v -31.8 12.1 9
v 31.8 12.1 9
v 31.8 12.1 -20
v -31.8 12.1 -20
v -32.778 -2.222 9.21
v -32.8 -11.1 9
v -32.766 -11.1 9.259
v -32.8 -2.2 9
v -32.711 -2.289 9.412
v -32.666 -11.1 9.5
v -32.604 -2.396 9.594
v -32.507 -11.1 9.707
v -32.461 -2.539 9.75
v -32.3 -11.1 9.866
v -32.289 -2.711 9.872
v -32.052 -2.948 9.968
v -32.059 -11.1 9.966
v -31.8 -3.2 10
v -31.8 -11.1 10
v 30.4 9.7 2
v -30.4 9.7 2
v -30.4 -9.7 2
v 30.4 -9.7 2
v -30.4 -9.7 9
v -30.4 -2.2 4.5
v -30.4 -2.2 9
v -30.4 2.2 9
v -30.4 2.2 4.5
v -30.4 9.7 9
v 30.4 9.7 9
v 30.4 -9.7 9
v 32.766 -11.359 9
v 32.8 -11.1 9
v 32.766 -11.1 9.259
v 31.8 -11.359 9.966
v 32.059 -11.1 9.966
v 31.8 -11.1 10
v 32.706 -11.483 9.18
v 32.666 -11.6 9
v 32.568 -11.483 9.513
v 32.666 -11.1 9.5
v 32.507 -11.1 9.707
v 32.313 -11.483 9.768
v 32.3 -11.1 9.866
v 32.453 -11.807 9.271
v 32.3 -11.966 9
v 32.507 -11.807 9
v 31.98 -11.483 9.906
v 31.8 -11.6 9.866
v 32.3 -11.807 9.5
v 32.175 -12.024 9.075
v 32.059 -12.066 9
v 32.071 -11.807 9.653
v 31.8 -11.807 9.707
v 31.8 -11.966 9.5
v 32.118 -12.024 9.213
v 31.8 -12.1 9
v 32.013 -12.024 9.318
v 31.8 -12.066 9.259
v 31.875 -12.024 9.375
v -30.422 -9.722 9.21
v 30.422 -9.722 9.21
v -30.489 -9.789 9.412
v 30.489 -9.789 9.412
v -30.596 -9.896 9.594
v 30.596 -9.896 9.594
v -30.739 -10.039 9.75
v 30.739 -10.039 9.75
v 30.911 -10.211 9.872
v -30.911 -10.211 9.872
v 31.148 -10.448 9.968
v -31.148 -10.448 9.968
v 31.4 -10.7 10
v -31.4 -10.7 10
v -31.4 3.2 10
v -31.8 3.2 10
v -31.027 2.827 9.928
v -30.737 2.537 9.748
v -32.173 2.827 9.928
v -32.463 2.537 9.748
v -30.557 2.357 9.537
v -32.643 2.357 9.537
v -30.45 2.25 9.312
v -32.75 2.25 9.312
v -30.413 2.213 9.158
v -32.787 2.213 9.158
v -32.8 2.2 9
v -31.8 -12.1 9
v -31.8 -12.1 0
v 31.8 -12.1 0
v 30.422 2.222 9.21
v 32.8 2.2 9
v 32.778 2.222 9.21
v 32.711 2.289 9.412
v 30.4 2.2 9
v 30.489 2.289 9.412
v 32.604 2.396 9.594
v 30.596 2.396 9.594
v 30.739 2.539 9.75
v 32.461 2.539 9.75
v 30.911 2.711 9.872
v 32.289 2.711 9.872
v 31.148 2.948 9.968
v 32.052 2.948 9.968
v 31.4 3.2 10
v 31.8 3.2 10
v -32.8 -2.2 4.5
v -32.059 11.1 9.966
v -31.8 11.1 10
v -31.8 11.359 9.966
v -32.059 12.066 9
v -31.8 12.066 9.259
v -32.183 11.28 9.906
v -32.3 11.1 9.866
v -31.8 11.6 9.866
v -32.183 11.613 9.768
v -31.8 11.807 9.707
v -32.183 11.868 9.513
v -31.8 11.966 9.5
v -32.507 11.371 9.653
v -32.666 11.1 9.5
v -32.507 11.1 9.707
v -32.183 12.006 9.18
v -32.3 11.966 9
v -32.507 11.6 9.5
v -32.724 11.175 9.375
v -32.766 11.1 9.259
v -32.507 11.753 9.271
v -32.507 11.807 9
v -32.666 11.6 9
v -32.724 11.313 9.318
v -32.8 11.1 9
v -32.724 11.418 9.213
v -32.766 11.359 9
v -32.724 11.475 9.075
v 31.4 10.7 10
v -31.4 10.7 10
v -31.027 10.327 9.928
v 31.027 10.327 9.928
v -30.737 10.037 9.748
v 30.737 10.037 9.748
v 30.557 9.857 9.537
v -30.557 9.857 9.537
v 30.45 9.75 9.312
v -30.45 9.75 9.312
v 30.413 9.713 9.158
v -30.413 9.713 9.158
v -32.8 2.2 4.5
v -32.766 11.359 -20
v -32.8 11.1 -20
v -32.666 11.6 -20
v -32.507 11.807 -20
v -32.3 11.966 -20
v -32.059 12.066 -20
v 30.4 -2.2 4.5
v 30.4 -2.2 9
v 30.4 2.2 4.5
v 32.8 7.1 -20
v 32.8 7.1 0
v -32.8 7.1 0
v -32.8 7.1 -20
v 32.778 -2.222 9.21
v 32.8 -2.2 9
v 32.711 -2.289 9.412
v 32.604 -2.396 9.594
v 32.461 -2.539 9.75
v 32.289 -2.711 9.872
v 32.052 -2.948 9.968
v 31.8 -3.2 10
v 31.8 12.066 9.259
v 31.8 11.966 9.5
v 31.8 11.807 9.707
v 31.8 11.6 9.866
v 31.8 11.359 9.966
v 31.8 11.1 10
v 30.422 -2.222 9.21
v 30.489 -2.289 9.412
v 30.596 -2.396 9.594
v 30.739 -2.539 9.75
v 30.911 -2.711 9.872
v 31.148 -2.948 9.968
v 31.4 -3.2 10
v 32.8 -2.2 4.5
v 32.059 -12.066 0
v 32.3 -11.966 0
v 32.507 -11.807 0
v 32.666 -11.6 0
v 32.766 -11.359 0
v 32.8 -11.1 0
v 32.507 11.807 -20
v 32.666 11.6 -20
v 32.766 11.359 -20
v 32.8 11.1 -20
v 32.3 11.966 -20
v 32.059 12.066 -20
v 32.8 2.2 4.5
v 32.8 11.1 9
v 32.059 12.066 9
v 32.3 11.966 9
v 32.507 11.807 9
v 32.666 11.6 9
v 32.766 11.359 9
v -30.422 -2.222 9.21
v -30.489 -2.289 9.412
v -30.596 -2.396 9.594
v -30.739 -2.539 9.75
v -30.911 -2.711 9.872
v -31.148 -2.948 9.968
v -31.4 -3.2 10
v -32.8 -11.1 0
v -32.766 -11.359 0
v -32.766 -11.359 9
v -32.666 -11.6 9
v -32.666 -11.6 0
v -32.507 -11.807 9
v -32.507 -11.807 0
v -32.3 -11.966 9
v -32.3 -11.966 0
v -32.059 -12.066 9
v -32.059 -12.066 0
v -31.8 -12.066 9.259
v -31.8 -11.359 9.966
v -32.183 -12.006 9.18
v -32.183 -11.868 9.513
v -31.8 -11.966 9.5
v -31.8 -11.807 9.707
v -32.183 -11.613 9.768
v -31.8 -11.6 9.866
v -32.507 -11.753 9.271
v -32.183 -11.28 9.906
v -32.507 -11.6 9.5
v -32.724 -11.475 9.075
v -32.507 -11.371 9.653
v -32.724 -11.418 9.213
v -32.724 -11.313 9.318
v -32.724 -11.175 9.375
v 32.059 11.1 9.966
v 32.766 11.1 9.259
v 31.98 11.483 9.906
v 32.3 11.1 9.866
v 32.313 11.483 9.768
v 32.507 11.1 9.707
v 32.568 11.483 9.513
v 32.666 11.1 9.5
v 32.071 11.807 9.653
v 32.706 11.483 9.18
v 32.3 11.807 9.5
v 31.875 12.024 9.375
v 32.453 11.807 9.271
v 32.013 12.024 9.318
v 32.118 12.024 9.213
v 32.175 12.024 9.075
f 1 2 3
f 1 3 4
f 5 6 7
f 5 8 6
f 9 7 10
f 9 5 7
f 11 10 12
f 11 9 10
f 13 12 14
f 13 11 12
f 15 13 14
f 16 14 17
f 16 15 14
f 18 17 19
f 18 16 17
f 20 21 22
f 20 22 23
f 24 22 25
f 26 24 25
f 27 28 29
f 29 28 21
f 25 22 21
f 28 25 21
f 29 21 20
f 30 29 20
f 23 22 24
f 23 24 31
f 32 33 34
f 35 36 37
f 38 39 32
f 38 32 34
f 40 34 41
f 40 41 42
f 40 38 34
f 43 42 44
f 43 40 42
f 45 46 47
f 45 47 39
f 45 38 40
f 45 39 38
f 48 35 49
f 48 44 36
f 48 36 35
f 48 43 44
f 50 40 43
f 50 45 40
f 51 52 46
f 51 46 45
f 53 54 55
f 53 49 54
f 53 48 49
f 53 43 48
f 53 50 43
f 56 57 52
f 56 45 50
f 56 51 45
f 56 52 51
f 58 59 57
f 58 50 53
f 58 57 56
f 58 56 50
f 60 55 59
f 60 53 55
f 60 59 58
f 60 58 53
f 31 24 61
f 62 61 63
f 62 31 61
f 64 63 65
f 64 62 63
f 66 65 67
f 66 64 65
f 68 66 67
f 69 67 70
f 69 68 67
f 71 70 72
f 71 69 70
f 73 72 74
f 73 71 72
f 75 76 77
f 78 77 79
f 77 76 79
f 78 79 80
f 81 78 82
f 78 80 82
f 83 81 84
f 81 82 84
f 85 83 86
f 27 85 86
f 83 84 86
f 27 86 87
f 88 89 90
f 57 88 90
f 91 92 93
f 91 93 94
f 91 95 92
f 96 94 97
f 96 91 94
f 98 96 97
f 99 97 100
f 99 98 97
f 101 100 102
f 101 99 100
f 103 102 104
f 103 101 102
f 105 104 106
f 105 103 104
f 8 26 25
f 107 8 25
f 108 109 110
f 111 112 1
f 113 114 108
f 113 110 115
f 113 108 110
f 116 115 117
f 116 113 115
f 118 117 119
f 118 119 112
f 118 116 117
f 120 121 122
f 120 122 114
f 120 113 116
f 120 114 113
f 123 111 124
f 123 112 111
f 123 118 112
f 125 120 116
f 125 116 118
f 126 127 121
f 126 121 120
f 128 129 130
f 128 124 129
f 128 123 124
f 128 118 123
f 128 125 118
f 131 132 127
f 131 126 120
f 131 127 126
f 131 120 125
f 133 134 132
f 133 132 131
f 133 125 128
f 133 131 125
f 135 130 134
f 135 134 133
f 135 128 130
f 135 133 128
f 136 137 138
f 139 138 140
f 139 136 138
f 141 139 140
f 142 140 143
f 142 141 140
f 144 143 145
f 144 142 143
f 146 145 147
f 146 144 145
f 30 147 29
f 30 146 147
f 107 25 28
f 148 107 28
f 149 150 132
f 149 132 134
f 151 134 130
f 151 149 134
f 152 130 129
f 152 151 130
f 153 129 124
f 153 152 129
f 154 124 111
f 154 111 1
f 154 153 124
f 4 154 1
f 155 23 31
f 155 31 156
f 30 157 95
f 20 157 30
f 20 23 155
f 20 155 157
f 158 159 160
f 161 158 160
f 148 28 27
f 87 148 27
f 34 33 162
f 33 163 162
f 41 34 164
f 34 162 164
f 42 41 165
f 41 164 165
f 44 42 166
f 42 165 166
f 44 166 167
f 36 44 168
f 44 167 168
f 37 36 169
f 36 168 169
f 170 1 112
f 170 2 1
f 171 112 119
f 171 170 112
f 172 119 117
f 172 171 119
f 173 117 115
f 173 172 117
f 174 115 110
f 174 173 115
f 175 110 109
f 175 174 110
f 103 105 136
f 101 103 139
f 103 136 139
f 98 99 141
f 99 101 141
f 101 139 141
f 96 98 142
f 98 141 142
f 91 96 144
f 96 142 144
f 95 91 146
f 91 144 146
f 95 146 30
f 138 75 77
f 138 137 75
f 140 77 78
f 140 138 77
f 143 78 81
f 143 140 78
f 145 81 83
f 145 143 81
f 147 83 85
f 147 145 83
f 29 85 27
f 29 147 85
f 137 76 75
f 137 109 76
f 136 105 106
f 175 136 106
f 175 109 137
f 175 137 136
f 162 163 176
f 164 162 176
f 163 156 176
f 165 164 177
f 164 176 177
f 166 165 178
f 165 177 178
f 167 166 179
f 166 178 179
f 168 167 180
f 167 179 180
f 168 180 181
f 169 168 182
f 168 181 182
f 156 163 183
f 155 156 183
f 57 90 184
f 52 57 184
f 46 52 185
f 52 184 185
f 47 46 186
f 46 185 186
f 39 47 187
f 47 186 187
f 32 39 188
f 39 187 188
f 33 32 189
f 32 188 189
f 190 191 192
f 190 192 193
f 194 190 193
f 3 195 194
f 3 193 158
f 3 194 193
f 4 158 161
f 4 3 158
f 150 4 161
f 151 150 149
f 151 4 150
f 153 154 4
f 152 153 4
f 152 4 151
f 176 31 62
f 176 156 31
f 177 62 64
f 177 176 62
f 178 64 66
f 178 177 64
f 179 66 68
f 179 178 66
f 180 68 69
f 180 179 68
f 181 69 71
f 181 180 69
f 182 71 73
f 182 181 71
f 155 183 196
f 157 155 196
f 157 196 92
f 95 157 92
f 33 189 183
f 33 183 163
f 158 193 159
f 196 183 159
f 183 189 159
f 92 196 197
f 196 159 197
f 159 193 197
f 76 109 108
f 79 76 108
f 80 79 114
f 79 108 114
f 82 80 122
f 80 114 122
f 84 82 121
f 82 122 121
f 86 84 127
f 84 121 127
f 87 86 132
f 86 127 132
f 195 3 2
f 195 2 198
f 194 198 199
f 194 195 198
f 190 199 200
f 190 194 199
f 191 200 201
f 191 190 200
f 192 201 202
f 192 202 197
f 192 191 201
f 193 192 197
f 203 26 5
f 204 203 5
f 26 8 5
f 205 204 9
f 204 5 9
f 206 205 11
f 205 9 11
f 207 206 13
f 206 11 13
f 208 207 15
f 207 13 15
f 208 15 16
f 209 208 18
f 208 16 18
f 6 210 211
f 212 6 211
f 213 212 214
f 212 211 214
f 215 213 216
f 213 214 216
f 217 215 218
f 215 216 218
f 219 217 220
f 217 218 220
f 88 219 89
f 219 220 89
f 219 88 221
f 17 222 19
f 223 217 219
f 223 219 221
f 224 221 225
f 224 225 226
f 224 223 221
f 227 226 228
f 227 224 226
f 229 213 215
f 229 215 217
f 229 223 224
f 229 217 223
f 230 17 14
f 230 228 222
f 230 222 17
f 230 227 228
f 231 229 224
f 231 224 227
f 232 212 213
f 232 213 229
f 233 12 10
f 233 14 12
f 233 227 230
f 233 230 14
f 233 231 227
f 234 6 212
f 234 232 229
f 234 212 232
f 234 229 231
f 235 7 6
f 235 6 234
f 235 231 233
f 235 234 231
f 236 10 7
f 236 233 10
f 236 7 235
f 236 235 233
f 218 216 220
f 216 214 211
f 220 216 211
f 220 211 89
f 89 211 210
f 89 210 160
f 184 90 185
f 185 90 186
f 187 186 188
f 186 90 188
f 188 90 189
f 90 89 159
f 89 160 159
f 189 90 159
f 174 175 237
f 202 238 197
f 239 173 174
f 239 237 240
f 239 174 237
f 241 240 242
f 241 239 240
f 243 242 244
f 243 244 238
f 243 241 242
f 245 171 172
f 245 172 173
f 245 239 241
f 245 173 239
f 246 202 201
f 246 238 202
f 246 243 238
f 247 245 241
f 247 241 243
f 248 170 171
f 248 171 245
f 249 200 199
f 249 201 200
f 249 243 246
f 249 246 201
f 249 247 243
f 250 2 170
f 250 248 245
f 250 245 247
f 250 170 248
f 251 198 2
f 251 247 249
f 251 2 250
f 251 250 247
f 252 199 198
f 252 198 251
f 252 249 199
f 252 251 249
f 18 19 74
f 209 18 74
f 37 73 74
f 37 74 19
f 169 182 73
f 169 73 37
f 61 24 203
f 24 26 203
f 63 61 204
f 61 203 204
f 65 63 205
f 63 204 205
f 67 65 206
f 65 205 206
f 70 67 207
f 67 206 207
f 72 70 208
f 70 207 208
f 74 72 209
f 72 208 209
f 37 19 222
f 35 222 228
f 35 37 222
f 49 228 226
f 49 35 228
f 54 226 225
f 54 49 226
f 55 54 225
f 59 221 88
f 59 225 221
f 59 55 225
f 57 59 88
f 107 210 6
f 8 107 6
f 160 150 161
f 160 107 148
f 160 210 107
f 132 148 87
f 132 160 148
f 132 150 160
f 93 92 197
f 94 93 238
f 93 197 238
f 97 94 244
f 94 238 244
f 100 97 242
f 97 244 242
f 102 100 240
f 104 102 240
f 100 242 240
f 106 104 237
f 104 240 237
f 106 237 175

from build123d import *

# Parameters (mm, degrees)
F0_W         = 65.6
F0_H         = 24.2
F0_W_2       = 60.8
F0_H_2       = 19.4
F1_DEPTH     = 10
F2_DEPTH     = 2
F4_DEPTH     = 65.601
F5_W         = 65.6
F5_H         = 20
F6_DEPTH     = 5
F7_R         = 1
F8_R         = 1
F9_T1_DEPTH  = 31.5
F9_T3_DEPTH  = 11.5
F9_S7_W      = 1
F9_S7_H      = 1
F9_T8_DEPTH  = 1
F9_S13_W     = 1
F9_S13_H     = 1
F9_T14_DEPTH = 1
F9_S19_W     = 1
F9_S19_H     = 1
F9_T20_DEPTH = 1
F9_S25_W     = 1
F9_S25_H     = 1
F9_T26_DEPTH = 1


# Not quite as in the source:
# - a fillet or chamfer that OpenCascade refuses, or shapes differently, is made with other operations: its cross-section is extruded or revolved along the edge and cut away or added


with BuildPart() as f1:
    # F0 (on Top) → F1 (new body)
    with BuildSketch(Plane.XY):
        Rectangle(F0_W, F0_H)
        Rectangle(F0_W_2, F0_H_2, mode=Mode.SUBTRACT)
    extrude(amount=F1_DEPTH)

    # F0 (on Top) → F2 (join)
    with BuildSketch(Plane.XY):
        Rectangle(F0_W_2, F0_H_2)
    extrude(amount=F2_DEPTH)

    # F3 (on face) → F4 (cut, through all)
    with BuildSketch(Plane.YZ.offset(32.8)):
        Polygon((2.2, 10), (0, 10), (-2.2, 10), (-2.2, 4.5), (0, 4.5), (2.2, 4.5), align=None)
    extrude(amount=-F4_DEPTH, mode=Mode.SUBTRACT)

    # F5 (on face) → F6 (join)
    with BuildSketch(Plane(origin=(0, 12.1, 0), x_dir=(-1, 0, 0), z_dir=(0, 1, 0))):
        with Locations((0, -10)):
            Rectangle(F5_W, F5_H)
    extrude(amount=-F6_DEPTH)

    # F7
    f7_edges = [f1.edges().sort_by_distance(p)[0] for p in [
        (0, -9.7, 10),
        (0, -12.1, 10),
        (-32.8, -7.15, 10),
        (32.8, -7.15, 10),
        (30.4, -5.95, 10),
        (-31.6, -2.2, 10),
        (31.6, -2.2, 10),
        (-30.4, -5.95, 10),
    ]]
    fillet(f7_edges, radius=F7_R)

    # F8
    f8_edges = [f1.edges().sort_by_distance(p)[0] for p in [
        (-31.6, 2.2, 10),
        (31.6, 2.2, 10),
        (32.8, 7.15, 10),
        (-32.8, 7.15, 10),
        (-30.4, 5.95, 10),
        (30.4, 5.95, 10),
        (0, 9.7, 10),
        (0, 12.1, 10),
    ]]
    fillet(f8_edges, radius=F8_R)

    # F9: fillet of radius 1 on 4 edges, made by hand

    # F9_s2 → F9_t1 (cut)
    with BuildSketch(Plane.XY.offset(-22.5)):
        with BuildLine():
            ThreePointArc((31.8, 12.1), (32.5071067812, 11.8071067812), (32.8, 11.1))
            Line((32.8, 11.1), (32.8, 12.1))
            Line((32.8, 12.1), (31.8, 12.1))
        make_face()
        with BuildLine():
            ThreePointArc((-32.8, 11.1), (-32.5071067812, 11.8071067812), (-31.8, 12.1))
            Line((-31.8, 12.1), (-32.8, 12.1))
            Line((-32.8, 12.1), (-32.8, 11.1))
        make_face()
    extrude(amount=F9_T1_DEPTH, mode=Mode.SUBTRACT)

    # F9_s4 → F9_t3 (cut)
    with BuildSketch(Plane.XY.offset(-2.5)):
        with BuildLine():
            ThreePointArc((31.8, -12.1), (32.5071067812, -11.8071067812), (32.8, -11.1))
            Line((32.8, -11.1), (32.8, -12.1))
            Line((32.8, -12.1), (31.8, -12.1))
        make_face()
        with BuildLine():
            ThreePointArc((-32.8, -11.1), (-32.5071067812, -11.8071067812), (-31.8, -12.1))
            Line((-31.8, -12.1), (-32.8, -12.1))
            Line((-32.8, -12.1), (-32.8, -11.1))
        make_face()
    extrude(amount=F9_T3_DEPTH, mode=Mode.SUBTRACT)


with BuildPart() as f9_tool6:
    # F9_s7 → F9_t8 (new body)
    with BuildSketch(Plane.YZ.offset(-31.8)):
        with Locations((-11.6, 9.5)):
            Rectangle(F9_S7_W, F9_S7_H)
    extrude(amount=-F9_T8_DEPTH)

    # F9_s9 → F9_t10 (revolve, cut)
    with BuildSketch(Plane(origin=(-31.8, -11.1, 9), x_dir=(0, 0.7071067812, -0.7071067812), z_dir=(0, 0.7071067812, 0.7071067812))):
        with BuildLine():
            ThreePointArc((0, -1), (1, 0), (0, 1))
            Line((0, 1), (0, -1))
        make_face()
    revolve(axis=Axis((-31.8, -11.1, 9), (-1, 0, 0)), mode=Mode.SUBTRACT)


with BuildPart() as f1_1:
    add(f1.part)

    # F9_t5: cut F9_tool6
    add(f9_tool6.part, mode=Mode.SUBTRACT)


with BuildPart() as f9_tool12:
    # F9_s13 → F9_t14 (new body)
    with BuildSketch(Plane.YZ.offset(-31.8)):
        with Locations((11.6, 9.5)):
            Rectangle(F9_S13_W, F9_S13_H)
    extrude(amount=-F9_T14_DEPTH)

    # F9_s15 → F9_t16 (revolve, cut)
    with BuildSketch(Plane(origin=(-31.8, 11.1, 9), x_dir=(0, -0.7071067812, -0.7071067812), z_dir=(0, 0.7071067812, -0.7071067812))):
        with BuildLine():
            ThreePointArc((0, -1), (1, 0), (0, 1))
            Line((0, 1), (0, -1))
        make_face()
    revolve(axis=Axis((-31.8, 11.1, 9), (-1, 0, 0)), mode=Mode.SUBTRACT)


with BuildPart() as f1_2:
    add(f1_1.part)

    # F9_t11: cut F9_tool12
    add(f9_tool12.part, mode=Mode.SUBTRACT)


with BuildPart() as f9_tool18:
    # F9_s19 → F9_t20 (new body)
    with BuildSketch(Plane.XZ.offset(11.1)):
        with Locations((32.3, 9.5)):
            Rectangle(F9_S19_W, F9_S19_H)
    extrude(amount=F9_T20_DEPTH)

    # F9_s21 → F9_t22 (revolve, cut)
    with BuildSketch(Plane(origin=(31.8, -11.1, 9), x_dir=(-0.7071067812, 0, -0.7071067812), z_dir=(-0.7071067812, 0, 0.7071067812))):
        with BuildLine():
            ThreePointArc((0, -1), (1, 0), (0, 1))
            Line((0, 1), (0, -1))
        make_face()
    revolve(axis=Axis((31.8, -11.1, 9), (0, -1, 0)), mode=Mode.SUBTRACT)


with BuildPart() as f1_3:
    add(f1_2.part)

    # F9_t17: cut F9_tool18
    add(f9_tool18.part, mode=Mode.SUBTRACT)


with BuildPart() as f9_tool24:
    # F9_s25 → F9_t26 (new body)
    with BuildSketch(Plane.XZ.offset(-11.1)):
        with Locations((32.3, 9.5)):
            Rectangle(F9_S25_W, F9_S25_H)
    extrude(amount=-F9_T26_DEPTH)

    # F9_s27 → F9_t28 (revolve, cut)
    with BuildSketch(Plane(origin=(31.8, 11.1, 9), x_dir=(-0.7071067812, 0, -0.7071067812), z_dir=(0.7071067812, 0, -0.7071067812))):
        with BuildLine():
            ThreePointArc((0, -1), (1, 0), (0, 1))
            Line((0, 1), (0, -1))
        make_face()
    revolve(axis=Axis((31.8, 11.1, 9), (0, 1, 0)), mode=Mode.SUBTRACT)


with BuildPart() as f1_4:
    add(f1_3.part)

    # F9_t23: cut F9_tool24
    add(f9_tool24.part, mode=Mode.SUBTRACT)


solid = f1_4.part
